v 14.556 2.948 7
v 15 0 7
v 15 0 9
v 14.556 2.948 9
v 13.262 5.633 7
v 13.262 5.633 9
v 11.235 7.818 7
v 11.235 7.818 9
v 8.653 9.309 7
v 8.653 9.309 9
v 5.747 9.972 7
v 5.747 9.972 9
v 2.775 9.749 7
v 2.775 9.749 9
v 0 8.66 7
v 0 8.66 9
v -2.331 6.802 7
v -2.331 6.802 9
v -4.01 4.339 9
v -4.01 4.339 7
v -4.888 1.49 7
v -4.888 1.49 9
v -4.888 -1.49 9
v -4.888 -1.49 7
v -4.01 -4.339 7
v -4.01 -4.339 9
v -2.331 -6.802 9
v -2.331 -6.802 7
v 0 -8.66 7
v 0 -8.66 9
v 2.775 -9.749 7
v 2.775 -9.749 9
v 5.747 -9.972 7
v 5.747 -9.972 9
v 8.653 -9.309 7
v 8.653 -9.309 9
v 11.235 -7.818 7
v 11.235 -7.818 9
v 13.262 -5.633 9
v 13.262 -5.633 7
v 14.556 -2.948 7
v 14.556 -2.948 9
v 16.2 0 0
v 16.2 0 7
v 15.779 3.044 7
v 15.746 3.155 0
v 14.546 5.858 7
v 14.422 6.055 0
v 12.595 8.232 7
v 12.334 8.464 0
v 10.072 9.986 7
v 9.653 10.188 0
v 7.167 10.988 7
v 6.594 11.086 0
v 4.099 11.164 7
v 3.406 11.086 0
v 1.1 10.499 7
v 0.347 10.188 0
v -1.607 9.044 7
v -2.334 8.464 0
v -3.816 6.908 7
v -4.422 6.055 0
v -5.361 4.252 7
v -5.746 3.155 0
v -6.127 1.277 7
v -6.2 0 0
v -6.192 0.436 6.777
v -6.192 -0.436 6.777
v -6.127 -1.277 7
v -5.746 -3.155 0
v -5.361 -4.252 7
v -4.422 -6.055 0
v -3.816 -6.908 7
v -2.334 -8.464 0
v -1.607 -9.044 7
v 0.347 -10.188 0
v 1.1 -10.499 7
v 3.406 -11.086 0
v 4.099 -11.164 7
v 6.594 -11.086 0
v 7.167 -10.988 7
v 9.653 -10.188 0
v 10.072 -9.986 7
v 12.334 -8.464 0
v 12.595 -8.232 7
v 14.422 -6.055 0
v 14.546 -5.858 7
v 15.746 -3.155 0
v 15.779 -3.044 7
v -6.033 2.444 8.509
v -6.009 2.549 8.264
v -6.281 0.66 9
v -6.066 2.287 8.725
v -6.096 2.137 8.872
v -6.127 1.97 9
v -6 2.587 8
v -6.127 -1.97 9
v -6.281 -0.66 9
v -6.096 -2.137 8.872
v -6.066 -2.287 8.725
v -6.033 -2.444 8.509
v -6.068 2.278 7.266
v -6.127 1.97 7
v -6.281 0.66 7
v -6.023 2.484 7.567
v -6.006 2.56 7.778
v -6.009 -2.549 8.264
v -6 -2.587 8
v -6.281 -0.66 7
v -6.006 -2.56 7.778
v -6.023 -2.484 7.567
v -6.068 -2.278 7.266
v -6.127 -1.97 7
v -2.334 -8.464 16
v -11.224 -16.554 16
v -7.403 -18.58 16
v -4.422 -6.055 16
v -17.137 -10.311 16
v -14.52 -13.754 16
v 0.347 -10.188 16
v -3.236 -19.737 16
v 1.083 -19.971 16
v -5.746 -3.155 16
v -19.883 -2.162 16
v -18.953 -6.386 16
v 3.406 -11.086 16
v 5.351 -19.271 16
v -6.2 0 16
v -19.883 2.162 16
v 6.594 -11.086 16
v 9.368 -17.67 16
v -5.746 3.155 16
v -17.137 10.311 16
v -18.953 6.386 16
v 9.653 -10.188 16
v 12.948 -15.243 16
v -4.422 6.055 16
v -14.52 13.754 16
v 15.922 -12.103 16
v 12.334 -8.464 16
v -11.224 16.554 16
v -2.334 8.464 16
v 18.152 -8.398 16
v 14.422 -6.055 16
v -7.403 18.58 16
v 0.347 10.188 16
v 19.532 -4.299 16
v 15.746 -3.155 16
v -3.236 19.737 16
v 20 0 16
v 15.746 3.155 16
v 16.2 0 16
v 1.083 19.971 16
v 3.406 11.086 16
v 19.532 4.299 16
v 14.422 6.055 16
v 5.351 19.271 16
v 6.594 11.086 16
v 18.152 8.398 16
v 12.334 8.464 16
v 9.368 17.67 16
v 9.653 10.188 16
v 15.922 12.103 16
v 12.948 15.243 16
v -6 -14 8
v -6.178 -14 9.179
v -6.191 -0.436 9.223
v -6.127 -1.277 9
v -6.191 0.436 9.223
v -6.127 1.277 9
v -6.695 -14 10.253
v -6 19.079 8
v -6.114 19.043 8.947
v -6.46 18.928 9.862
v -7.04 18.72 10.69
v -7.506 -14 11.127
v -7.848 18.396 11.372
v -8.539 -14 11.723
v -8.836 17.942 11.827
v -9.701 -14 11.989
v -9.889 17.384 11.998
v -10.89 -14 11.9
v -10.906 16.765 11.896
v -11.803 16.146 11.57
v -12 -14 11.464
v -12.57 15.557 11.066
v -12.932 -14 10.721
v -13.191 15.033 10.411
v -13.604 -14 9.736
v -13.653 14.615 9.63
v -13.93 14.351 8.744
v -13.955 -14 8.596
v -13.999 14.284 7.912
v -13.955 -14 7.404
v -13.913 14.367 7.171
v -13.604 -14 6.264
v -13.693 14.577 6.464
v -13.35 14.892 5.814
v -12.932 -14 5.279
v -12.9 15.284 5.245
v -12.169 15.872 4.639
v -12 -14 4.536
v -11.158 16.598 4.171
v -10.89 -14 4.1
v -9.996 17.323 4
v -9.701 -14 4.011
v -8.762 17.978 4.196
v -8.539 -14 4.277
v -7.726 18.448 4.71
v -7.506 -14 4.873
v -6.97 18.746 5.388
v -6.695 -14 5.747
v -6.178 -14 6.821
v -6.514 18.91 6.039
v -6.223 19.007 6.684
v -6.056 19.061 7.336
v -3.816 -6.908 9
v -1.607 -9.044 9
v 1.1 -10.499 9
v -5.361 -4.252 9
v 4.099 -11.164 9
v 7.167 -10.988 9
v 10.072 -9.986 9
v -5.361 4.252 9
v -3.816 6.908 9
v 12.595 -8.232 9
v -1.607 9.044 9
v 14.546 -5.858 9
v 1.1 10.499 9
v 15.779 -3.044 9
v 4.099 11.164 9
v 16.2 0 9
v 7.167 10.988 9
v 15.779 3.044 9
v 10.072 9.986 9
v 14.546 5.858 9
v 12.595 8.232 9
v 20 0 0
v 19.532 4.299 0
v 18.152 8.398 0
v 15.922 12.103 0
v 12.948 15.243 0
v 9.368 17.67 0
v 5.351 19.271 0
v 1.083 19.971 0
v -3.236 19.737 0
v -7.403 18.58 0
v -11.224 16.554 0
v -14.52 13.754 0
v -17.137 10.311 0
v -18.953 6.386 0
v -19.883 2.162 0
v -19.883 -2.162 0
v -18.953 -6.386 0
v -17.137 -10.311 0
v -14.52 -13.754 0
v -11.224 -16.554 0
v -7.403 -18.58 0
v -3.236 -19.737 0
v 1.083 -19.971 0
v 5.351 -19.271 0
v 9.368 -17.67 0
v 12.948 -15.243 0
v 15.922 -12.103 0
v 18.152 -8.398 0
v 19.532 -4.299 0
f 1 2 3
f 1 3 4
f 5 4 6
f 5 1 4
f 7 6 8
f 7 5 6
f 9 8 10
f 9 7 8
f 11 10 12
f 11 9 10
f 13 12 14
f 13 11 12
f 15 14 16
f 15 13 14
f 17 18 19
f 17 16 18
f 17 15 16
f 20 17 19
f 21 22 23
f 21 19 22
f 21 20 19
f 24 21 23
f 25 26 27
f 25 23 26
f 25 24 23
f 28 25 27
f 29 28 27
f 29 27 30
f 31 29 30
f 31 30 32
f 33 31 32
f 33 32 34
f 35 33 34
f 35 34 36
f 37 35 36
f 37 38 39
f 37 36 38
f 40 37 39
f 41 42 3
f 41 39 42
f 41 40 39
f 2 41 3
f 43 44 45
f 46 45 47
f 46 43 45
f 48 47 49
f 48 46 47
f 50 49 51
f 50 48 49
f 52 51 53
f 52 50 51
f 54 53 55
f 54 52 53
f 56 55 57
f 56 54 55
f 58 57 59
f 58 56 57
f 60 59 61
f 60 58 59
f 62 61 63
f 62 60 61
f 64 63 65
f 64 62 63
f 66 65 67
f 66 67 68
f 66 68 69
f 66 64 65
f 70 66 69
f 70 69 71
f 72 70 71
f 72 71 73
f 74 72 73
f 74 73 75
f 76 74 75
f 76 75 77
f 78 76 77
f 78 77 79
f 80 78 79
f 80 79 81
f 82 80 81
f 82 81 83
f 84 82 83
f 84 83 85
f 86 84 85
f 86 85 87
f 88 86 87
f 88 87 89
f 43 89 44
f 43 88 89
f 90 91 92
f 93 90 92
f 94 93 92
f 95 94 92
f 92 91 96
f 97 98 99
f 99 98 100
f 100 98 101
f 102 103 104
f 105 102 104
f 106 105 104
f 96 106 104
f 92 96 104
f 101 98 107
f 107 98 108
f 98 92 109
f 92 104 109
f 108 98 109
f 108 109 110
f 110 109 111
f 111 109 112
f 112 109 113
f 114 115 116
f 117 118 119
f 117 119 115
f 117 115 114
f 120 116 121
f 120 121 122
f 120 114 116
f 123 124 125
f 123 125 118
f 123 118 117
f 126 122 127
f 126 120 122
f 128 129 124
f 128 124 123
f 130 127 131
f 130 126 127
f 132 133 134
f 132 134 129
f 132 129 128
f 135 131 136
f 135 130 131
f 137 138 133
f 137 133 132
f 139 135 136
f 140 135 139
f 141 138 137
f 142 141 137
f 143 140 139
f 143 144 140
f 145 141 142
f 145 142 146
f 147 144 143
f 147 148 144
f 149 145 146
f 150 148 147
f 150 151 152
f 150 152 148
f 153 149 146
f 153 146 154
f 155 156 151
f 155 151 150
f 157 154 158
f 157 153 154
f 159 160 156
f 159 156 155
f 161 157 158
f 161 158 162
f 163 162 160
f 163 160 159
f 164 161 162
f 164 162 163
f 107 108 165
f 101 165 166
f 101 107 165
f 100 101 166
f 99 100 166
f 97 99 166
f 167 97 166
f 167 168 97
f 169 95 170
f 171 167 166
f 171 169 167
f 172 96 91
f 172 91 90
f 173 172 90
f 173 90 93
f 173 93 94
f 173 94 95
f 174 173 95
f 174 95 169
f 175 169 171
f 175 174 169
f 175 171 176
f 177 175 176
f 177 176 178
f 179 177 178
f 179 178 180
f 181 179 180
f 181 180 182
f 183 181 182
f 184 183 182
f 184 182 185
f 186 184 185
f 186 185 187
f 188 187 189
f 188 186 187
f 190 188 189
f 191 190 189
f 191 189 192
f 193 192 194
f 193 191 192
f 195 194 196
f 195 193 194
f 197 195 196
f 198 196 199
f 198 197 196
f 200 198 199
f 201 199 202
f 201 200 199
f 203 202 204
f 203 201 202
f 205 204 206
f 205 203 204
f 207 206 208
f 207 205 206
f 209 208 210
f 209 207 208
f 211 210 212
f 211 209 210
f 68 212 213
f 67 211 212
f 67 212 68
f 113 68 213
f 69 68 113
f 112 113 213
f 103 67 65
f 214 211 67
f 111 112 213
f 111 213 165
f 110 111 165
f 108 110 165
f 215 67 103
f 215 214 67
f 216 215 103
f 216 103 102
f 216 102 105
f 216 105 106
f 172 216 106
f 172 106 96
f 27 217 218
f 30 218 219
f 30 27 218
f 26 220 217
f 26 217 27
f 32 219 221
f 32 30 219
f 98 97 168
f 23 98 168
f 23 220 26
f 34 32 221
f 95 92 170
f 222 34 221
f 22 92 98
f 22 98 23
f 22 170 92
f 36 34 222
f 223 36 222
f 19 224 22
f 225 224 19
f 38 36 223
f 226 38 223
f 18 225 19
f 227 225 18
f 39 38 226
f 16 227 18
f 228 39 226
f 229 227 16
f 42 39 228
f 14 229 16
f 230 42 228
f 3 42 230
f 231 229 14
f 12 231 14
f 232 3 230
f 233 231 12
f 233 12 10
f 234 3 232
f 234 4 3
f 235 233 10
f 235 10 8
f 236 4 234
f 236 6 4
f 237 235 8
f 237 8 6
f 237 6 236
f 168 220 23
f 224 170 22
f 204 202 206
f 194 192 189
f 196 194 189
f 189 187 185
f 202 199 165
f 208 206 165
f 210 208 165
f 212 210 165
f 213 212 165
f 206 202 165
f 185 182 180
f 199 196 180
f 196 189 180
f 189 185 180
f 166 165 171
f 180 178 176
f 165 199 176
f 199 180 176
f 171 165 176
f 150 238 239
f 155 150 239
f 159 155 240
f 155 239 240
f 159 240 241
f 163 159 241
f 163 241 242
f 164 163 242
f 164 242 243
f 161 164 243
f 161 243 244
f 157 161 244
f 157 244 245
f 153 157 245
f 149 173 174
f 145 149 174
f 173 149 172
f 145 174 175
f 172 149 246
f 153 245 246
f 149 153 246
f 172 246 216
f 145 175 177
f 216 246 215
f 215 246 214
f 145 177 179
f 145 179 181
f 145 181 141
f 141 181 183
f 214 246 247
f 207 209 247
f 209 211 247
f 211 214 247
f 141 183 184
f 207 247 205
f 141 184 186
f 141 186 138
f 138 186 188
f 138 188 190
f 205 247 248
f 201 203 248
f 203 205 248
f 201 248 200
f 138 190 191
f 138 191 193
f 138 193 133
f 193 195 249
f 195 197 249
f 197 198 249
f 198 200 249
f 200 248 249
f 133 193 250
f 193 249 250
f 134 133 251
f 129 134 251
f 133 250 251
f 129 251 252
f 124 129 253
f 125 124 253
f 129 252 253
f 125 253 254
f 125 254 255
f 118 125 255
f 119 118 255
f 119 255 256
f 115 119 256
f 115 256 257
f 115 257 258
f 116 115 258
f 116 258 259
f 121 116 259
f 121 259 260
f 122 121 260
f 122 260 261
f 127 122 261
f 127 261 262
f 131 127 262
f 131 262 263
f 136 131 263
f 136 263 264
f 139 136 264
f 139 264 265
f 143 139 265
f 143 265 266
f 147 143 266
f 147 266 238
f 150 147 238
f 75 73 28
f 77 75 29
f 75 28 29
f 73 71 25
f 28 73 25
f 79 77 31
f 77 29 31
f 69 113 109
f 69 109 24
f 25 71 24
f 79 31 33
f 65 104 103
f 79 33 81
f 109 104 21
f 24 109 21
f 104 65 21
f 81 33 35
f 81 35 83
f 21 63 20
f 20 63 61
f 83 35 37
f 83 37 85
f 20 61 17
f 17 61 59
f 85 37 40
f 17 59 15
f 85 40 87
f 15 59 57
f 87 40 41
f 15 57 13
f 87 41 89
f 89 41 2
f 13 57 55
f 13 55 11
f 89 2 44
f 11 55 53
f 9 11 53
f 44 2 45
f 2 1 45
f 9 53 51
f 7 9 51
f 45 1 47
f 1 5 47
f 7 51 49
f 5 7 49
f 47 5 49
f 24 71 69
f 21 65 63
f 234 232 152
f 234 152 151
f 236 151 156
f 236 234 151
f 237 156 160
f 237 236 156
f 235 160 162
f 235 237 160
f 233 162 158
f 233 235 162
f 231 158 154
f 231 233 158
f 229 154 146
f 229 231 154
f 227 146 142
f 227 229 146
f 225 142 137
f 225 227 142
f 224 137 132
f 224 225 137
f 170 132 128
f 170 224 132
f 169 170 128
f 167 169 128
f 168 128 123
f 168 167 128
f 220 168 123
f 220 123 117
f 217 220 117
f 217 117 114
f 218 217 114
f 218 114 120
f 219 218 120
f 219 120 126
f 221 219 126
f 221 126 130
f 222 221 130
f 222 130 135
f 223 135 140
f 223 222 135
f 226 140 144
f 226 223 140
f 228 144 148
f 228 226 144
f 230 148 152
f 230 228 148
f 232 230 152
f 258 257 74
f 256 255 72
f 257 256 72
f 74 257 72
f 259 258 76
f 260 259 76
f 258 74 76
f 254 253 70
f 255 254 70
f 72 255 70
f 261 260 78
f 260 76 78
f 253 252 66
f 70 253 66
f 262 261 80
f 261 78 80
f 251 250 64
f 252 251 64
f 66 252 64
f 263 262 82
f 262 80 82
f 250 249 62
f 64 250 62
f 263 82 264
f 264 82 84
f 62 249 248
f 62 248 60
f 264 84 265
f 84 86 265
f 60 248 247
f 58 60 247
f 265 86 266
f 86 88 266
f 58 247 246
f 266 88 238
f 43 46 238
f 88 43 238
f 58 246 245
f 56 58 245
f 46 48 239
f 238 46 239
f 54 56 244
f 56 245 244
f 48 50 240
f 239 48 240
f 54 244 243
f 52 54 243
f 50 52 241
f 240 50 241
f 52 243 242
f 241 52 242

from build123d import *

# Parameters (mm, degrees)
CYLINDER004_R          = 10
CYLINDER004_DEPTH      = 10
CYLINDER003_R          = 11.3
CYLINDER003_DEPTH      = 2
CYLINDER002_R          = 4
CYLINDER002_DEPTH      = 40
CYLINDER002_ROLL_ANGLE = 90
CYLINDER001_R          = 11.2
CYLINDER001_DEPTH      = 16
CYLINDER_R             = 20
CYLINDER_DEPTH         = 16


with BuildPart() as cylinder004:
    # Cylinder004 → Cylinder004 (new body)
    with BuildSketch(Plane(origin=(5, 0, 0), x_dir=(1, 0, 0), z_dir=(0, 0, 1))):
        Circle(CYLINDER004_R)
    extrude(amount=CYLINDER004_DEPTH)


with BuildPart() as cylinder003:
    # Cylinder003 → Cylinder003 (new body)
    with BuildSketch(Plane(origin=(5, 0, 7), x_dir=(1, 0, 0), z_dir=(0, 0, 1))):
        Circle(CYLINDER003_R)
    extrude(amount=CYLINDER003_DEPTH)


with BuildPart() as cylinder002:
    # Cylinder002 → Cylinder002 (new body)
    with BuildSketch(Plane.XY):
        Circle(CYLINDER002_R)
    extrude(amount=CYLINDER002_DEPTH)


with BuildPart() as cylinder002_1:
    # Cylinder002 roll: moved
    add(cylinder002.part.rotate(Axis((0, 0, 0), (1, 0, 0)), CYLINDER002_ROLL_ANGLE))


with BuildPart() as cylinder002_2:
    # Cylinder002 placement: moved
    add(cylinder002_1.part.moved(Location((-10, 26, 8))))


with BuildPart() as cylinder001:
    # Cylinder001 → Cylinder001 (new body)
    with BuildSketch(Plane(origin=(5, 0, 0), x_dir=(1, 0, 0), z_dir=(0, 0, 1))):
        Circle(CYLINDER001_R)
    extrude(amount=CYLINDER001_DEPTH)


with BuildPart() as cut002:
    # Cylinder → Cylinder (new body)
    with BuildSketch(Plane.XY):
        Circle(CYLINDER_R)
    extrude(amount=CYLINDER_DEPTH)

    # Cut: cut Cylinder001
    add(cylinder001.part, mode=Mode.SUBTRACT)

    # Cut001: cut Cylinder002
    add(cylinder002_2.part, mode=Mode.SUBTRACT)

    # Fusion: union Cylinder003
    add(cylinder003.part)

    # Cut002: cut Cylinder004
    add(cylinder004.part, mode=Mode.SUBTRACT)


solid = cut002.part
